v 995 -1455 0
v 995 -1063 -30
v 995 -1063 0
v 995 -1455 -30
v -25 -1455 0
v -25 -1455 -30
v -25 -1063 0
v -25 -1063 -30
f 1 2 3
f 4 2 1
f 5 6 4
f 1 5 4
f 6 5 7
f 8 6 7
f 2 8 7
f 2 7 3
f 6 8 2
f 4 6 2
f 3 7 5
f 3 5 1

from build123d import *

# Parameters (mm, degrees)
TABAN_FLAN_1_DEPTH          = 30
KES_EKSTR_ZYON1_DEPTH       = 6331.979387109
KES_EKSTR_ZYON1_DEPTH_BACK  = 6331.979387109
IZIM2_W                     = 3010
IZIM2_H                     = 410
KES_EKSTR_ZYON2_DEPTH       = 6331.979387109
KES_EKSTR_ZYON2_DEPTH_BACK  = 6331.979387109
IZIM3_W                     = 170
IZIM3_H                     = 410
IZIM4_W                     = 25
IZIM4_H                     = 1460
SEKME1_DEPTH                = 30
KES_EKSTR_ZYON3_DEPTH       = 6213.326456329
KES_EKSTR_ZYON3_DEPTH_BACK  = 6213.326456329
IZIM5_W                     = 75
IZIM5_H                     = 150
KES_EKSTR_ZYON4_DEPTH       = 6176.151819996
KES_EKSTR_ZYON4_DEPTH_BACK  = 6176.151819996
IZIM6_W                     = 75
IZIM6_H                     = 90
IZIM6_W_2                   = 5
IZIM6_H_2                   = 645
KES_EKSTR_ZYON5_DEPTH       = 6171.293753137
KES_EKSTR_ZYON5_DEPTH_BACK  = 6171.293753137
IZIM9_W                     = 2920
IZIM9_H                     = 5
IZIM9_W_2                   = 3100
KES_EKSTR_ZYON6_DEPTH       = 6170.112577997
KES_EKSTR_ZYON6_DEPTH_BACK  = 6170.112577997
KES_EKSTR_ZYON7_DEPTH       = 3949.015324185
KES_EKSTR_ZYON7_DEPTH_BACK  = 3949.015324185
KES_EKSTR_ZYON8_DEPTH       = 2269.374969003
KES_EKSTR_ZYON8_DEPTH_BACK  = 2269.374969003
IZIM13_W                    = 523
IZIM13_H                    = 467
KES_EKSTR_ZYON9_DEPTH       = 2269.374969003
KES_EKSTR_ZYON9_DEPTH_BACK  = 2269.374969003
IZIM14_W                    = 740
IZIM14_H                    = 168
KES_EKSTR_ZYON10_DEPTH      = 1763.937888866
KES_EKSTR_ZYON10_DEPTH_BACK = 1763.937888866
IZIM15_W                    = 1020
IZIM15_H                    = 243


# Sheet-metal steps are written as plain solids
with BuildPart() as part:
    # Çizim1 → Taban-Flanş1 (new body)
    with BuildSketch(Plane.XY):
        Polygon((0, 0), (5240, 0), (5240, -90), (6000, -90), (6000, -2020), (0, -2020), align=None)
    extrude(amount=-TABAN_FLAN_1_DEPTH)

    # Çizim2 → Kes-Ekstrüzyon1 (cut, two sides: drawn at the far end of the back side and taken through both)
    with BuildSketch(Plane.XY.offset(-KES_EKSTR_ZYON1_DEPTH_BACK)):
        with Locations((4495, -1815)):
            Rectangle(IZIM2_W, IZIM2_H)
    extrude(amount=KES_EKSTR_ZYON1_DEPTH + KES_EKSTR_ZYON1_DEPTH_BACK, mode=Mode.SUBTRACT)

    # Çizim3 → Kes-Ekstrüzyon2 (cut, two sides: drawn at the far end of the back side and taken through both)
    with BuildSketch(Plane.XY.offset(-KES_EKSTR_ZYON2_DEPTH_BACK)):
        Polygon((0, -1460), (0, -2020), (2820, -2020), (2820, -1610), (2820, -1460), align=None)
        with Locations((2905, -1815)):
            Rectangle(IZIM3_W, IZIM3_H)
    extrude(amount=KES_EKSTR_ZYON2_DEPTH + KES_EKSTR_ZYON2_DEPTH_BACK, mode=Mode.SUBTRACT)

    # Çizim4 → Sekme1 (add)
    with BuildSketch(Plane.XY):
        with Locations((-12.5, -730)):
            Rectangle(IZIM4_W, IZIM4_H)
    extrude(amount=-SEKME1_DEPTH)

    # Çizim5 → Kes-Ekstrüzyon3 (cut, two sides: drawn at the far end of the back side and taken through both)
    with BuildSketch(Plane.XY.offset(-KES_EKSTR_ZYON3_DEPTH_BACK)):
        Polygon((2895, -1610), (6000, -1610), (6000, -1205), (2895, -1205), (2895, -1460), align=None)
        with Locations((2857.5, -1535)):
            Rectangle(IZIM5_W, IZIM5_H)
    extrude(amount=KES_EKSTR_ZYON3_DEPTH + KES_EKSTR_ZYON3_DEPTH_BACK, mode=Mode.SUBTRACT)

    # Çizim6 → Kes-Ekstrüzyon4 (cut, two sides: drawn at the far end of the back side and taken through both)
    with BuildSketch(Plane.XY.offset(-KES_EKSTR_ZYON4_DEPTH_BACK)):
        Polygon((6000, -560), (6000, -90), (5240, -90), (5165, -90), (5165, -560), (5995, -560), align=None)
        with Locations((5202.5, -45)):
            Rectangle(IZIM6_W, IZIM6_H)
        with Locations((5997.5, -882.5)):
            Rectangle(IZIM6_W_2, IZIM6_H_2)
    extrude(amount=KES_EKSTR_ZYON4_DEPTH + KES_EKSTR_ZYON4_DEPTH_BACK, mode=Mode.SUBTRACT)

    # Çizim9 → Kes-Ekstrüzyon5 (cut, two sides: drawn at the far end of the back side and taken through both)
    with BuildSketch(Plane.XY.offset(-KES_EKSTR_ZYON5_DEPTH_BACK)):
        with Locations((1435, -1457.5)):
            Rectangle(IZIM9_W, IZIM9_H)
        with Locations((4445, -1202.5)):
            Rectangle(IZIM9_W_2, IZIM9_H)
    extrude(amount=KES_EKSTR_ZYON5_DEPTH + KES_EKSTR_ZYON5_DEPTH_BACK, mode=Mode.SUBTRACT)

    # Çizim10 → Kes-Ekstrüzyon6 (cut, two sides: drawn at the far end of the back side and taken through both)
    with BuildSketch(Plane.XY.offset(-KES_EKSTR_ZYON6_DEPTH_BACK)):
        Polygon((3670, 0), (3670, -461), (2865, -461), (2865, -1455), (6281.695109379, -1455), (6281.695109379, 0), align=None)
    extrude(amount=KES_EKSTR_ZYON6_DEPTH + KES_EKSTR_ZYON6_DEPTH_BACK, mode=Mode.SUBTRACT)

    # Çizim11 → Kes-Ekstrüzyon7 (cut, two sides: drawn at the far end of the back side and taken through both)
    with BuildSketch(Plane.XY.offset(-KES_EKSTR_ZYON7_DEPTH_BACK)):
        Polygon((1740, 0), (1740, -988), (1523, -988), (1523, -1455), (2865, -1455), (2865, -461), (3670, -461), (3670, 0), align=None)
    extrude(amount=KES_EKSTR_ZYON7_DEPTH + KES_EKSTR_ZYON7_DEPTH_BACK, mode=Mode.SUBTRACT)

    # Çizim13 → Kes-Ekstrüzyon8 (cut, two sides: drawn at the far end of the back side and taken through both)
    with BuildSketch(Plane.XY.offset(-KES_EKSTR_ZYON8_DEPTH_BACK)):
        with Locations((1261.5, -1221.5)):
            Rectangle(IZIM13_W, IZIM13_H)
    extrude(amount=KES_EKSTR_ZYON8_DEPTH + KES_EKSTR_ZYON8_DEPTH_BACK, mode=Mode.SUBTRACT)

    # Çizim14 → Kes-Ekstrüzyon9 (cut, two sides: drawn at the far end of the back side and taken through both)
    with BuildSketch(Plane.XY.offset(-KES_EKSTR_ZYON9_DEPTH_BACK)):
        Polygon((1740, 0), (-25, 0), (-25, -820), (995, -820), (1000, -820), (1740, -820), align=None)
        with Locations((1370, -904)):
            Rectangle(IZIM14_W, IZIM14_H)
        Polygon((1000, -820), (995, -820), (995, -1455), (1000, -1455), (1000, -988), align=None)
    extrude(amount=KES_EKSTR_ZYON9_DEPTH + KES_EKSTR_ZYON9_DEPTH_BACK, mode=Mode.SUBTRACT)

    # Çizim15 → Kes-Ekstrüzyon10 (cut, two sides: drawn at the far end of the back side and taken through both)
    with BuildSketch(Plane.XY.offset(-KES_EKSTR_ZYON10_DEPTH_BACK)):
        with Locations((485, -941.5)):
            Rectangle(IZIM15_W, IZIM15_H)
    extrude(amount=KES_EKSTR_ZYON10_DEPTH + KES_EKSTR_ZYON10_DEPTH_BACK, mode=Mode.SUBTRACT)


solid = part.part
